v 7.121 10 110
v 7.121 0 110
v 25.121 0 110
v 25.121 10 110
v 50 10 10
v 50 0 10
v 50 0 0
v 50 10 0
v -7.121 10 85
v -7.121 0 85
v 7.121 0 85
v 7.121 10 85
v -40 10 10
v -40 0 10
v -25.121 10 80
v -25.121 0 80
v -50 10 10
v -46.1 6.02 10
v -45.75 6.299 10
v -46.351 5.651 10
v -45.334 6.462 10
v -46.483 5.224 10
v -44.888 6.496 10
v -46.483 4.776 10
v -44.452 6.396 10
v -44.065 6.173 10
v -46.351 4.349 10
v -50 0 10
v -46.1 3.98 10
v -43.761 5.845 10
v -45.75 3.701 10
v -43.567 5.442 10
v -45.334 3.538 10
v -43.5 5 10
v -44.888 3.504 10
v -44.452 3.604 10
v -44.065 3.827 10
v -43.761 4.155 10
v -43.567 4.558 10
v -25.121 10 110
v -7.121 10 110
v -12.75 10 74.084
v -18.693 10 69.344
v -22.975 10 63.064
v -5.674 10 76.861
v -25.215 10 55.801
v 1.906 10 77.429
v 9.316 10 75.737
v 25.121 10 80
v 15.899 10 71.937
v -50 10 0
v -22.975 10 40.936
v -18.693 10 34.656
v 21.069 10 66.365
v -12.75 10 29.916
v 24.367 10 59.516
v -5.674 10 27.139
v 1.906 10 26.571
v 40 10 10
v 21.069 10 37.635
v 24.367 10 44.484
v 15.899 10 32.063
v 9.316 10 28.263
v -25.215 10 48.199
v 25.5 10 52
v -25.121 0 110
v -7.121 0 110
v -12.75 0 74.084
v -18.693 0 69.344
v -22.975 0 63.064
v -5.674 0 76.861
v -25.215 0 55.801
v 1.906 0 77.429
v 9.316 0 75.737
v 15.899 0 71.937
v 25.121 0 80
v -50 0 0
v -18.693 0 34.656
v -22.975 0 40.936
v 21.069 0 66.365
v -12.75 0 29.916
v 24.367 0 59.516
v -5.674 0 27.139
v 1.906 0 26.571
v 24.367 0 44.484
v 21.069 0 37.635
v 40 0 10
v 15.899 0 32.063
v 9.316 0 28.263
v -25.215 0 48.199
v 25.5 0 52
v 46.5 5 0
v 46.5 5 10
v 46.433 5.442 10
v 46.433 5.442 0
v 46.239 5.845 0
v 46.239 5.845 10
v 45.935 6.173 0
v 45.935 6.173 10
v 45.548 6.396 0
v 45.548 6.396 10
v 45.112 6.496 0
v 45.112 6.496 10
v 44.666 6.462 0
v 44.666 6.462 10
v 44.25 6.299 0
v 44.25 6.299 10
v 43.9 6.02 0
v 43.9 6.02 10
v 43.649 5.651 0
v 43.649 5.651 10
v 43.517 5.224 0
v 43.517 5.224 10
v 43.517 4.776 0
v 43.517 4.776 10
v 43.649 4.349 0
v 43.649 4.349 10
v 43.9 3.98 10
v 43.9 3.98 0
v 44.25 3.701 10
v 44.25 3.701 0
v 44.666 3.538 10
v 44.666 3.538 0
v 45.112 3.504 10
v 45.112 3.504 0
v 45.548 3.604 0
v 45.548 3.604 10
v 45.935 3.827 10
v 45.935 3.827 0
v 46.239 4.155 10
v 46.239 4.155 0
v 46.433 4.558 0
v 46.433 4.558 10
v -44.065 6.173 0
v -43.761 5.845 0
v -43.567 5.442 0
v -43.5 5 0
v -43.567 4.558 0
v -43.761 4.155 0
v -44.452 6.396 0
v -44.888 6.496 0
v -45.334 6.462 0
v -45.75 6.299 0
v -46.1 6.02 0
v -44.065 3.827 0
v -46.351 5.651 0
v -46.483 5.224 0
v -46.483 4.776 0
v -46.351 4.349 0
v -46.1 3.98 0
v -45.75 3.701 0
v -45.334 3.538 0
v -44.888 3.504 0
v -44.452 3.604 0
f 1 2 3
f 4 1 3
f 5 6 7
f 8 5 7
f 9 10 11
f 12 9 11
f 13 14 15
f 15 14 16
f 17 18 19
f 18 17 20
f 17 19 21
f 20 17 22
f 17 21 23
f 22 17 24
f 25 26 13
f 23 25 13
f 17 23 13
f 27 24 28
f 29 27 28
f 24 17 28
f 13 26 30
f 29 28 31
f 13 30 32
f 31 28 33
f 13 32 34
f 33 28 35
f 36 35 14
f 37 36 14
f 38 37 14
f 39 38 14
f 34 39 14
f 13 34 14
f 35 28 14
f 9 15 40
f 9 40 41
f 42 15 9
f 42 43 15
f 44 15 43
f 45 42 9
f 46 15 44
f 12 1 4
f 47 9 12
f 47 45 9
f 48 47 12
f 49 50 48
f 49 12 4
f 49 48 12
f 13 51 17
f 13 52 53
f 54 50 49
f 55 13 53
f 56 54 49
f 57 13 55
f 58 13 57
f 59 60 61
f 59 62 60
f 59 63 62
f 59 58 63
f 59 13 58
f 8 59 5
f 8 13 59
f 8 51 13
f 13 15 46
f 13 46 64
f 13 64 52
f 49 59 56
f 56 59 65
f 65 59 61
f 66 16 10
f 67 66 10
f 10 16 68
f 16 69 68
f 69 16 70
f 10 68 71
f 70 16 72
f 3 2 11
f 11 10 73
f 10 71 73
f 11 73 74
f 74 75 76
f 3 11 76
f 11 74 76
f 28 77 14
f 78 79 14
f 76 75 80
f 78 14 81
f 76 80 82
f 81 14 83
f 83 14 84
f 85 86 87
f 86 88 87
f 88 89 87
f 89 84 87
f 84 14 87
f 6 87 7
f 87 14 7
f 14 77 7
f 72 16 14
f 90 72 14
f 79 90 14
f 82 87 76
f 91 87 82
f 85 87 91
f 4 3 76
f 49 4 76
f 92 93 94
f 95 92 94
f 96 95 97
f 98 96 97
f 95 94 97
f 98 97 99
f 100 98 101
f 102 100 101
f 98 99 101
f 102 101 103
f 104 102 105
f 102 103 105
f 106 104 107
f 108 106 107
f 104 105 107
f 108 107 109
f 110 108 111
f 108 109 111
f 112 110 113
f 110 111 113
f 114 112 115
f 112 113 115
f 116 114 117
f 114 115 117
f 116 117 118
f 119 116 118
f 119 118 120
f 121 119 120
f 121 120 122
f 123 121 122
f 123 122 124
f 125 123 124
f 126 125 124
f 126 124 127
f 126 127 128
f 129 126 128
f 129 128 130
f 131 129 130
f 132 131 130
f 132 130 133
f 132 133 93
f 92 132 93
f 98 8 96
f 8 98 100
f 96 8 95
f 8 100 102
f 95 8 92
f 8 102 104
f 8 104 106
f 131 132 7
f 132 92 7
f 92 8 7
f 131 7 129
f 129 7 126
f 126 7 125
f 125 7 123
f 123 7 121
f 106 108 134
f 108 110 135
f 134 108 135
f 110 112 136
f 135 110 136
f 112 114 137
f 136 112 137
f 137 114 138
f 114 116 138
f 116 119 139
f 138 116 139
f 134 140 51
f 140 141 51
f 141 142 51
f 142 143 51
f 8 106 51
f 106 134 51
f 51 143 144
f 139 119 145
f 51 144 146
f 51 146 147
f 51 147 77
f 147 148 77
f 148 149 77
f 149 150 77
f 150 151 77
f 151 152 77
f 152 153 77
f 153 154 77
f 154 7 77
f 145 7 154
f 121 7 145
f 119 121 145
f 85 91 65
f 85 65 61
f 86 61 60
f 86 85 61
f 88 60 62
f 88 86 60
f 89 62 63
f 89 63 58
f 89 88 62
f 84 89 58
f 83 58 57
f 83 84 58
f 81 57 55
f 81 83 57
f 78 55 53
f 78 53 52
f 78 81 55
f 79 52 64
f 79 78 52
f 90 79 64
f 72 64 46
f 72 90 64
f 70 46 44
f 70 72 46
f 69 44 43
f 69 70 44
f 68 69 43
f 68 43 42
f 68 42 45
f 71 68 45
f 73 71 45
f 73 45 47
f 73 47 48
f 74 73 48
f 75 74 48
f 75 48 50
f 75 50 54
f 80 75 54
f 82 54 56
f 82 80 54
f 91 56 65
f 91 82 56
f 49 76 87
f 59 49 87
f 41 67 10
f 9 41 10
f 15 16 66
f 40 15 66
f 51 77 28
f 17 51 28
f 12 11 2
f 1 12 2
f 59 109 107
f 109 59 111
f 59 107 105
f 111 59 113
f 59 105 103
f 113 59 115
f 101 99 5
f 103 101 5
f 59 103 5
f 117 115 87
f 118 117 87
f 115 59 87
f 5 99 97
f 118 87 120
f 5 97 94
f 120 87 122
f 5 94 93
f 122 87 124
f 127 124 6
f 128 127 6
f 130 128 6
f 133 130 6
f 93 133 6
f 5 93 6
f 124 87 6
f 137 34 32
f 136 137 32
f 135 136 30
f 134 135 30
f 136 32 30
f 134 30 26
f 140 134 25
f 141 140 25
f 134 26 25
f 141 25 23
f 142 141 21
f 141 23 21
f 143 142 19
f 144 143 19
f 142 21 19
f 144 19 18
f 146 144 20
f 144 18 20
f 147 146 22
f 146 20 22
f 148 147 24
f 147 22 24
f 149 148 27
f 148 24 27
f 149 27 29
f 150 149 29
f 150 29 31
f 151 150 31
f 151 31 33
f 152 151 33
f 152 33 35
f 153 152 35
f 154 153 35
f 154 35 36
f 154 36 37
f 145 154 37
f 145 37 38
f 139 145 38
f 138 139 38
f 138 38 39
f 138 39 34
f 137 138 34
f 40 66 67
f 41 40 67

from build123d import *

# Parameters (mm, degrees)
CROQUIS1_R              = 25.5
SALIENTE_EXTRUIR1_DEPTH = 10
CORTAR_EXTRUIR1_REACH   = 12
CROQUIS2_R              = 1.5


with BuildPart() as part:
    # Croquis1 → Saliente-Extruir1 (new body)
    with BuildSketch(Plane(origin=(0, 0, 0), x_dir=(1, 0, 0), z_dir=(0, 1, 0))):
        Polygon((40, -10), (50, -10), (50, 0), (-50, 0), (-50, -10), (-40, -10), (-25.121040683, -80), (-25.121040683, -110), (-7.121040683, -110), (-7.121040683, -85), (7.121040683, -85), (7.121040683, -110), (25.121040683, -110), (25.121040683, -80), align=None)
        with Locations((0, -52)):
            Circle(CROQUIS1_R, mode=Mode.SUBTRACT)
    extrude(amount=SALIENTE_EXTRUIR1_DEPTH)

    # Croquis2 → Cortar-Extruir1 (cut, up to next)
    with BuildSketch(Plane.XY.offset(10), mode=Mode.PRIVATE) as cortar_extruir1_sk1:
        with Locations((-45, 5)):
            Circle(CROQUIS2_R)
    cortar_extruir1_tool1 = extrude(cortar_extruir1_sk1.sketch, amount=-CORTAR_EXTRUIR1_REACH, mode=Mode.PRIVATE) & part.part
    add(cortar_extruir1_tool1.solids().sort_by_distance((-45, 5, 10))[0], mode=Mode.SUBTRACT)
    # Croquis2 → Cortar-Extruir1 (cut, up to next)
    with BuildSketch(Plane.XY.offset(10), mode=Mode.PRIVATE) as cortar_extruir1_sk2:
        with Locations((45, 5)):
            Circle(CROQUIS2_R)
    cortar_extruir1_tool2 = extrude(cortar_extruir1_sk2.sketch, amount=-CORTAR_EXTRUIR1_REACH, mode=Mode.PRIVATE) & part.part
    add(cortar_extruir1_tool2.solids().sort_by_distance((45, 5, 10))[0], mode=Mode.SUBTRACT)


solid = part.part
